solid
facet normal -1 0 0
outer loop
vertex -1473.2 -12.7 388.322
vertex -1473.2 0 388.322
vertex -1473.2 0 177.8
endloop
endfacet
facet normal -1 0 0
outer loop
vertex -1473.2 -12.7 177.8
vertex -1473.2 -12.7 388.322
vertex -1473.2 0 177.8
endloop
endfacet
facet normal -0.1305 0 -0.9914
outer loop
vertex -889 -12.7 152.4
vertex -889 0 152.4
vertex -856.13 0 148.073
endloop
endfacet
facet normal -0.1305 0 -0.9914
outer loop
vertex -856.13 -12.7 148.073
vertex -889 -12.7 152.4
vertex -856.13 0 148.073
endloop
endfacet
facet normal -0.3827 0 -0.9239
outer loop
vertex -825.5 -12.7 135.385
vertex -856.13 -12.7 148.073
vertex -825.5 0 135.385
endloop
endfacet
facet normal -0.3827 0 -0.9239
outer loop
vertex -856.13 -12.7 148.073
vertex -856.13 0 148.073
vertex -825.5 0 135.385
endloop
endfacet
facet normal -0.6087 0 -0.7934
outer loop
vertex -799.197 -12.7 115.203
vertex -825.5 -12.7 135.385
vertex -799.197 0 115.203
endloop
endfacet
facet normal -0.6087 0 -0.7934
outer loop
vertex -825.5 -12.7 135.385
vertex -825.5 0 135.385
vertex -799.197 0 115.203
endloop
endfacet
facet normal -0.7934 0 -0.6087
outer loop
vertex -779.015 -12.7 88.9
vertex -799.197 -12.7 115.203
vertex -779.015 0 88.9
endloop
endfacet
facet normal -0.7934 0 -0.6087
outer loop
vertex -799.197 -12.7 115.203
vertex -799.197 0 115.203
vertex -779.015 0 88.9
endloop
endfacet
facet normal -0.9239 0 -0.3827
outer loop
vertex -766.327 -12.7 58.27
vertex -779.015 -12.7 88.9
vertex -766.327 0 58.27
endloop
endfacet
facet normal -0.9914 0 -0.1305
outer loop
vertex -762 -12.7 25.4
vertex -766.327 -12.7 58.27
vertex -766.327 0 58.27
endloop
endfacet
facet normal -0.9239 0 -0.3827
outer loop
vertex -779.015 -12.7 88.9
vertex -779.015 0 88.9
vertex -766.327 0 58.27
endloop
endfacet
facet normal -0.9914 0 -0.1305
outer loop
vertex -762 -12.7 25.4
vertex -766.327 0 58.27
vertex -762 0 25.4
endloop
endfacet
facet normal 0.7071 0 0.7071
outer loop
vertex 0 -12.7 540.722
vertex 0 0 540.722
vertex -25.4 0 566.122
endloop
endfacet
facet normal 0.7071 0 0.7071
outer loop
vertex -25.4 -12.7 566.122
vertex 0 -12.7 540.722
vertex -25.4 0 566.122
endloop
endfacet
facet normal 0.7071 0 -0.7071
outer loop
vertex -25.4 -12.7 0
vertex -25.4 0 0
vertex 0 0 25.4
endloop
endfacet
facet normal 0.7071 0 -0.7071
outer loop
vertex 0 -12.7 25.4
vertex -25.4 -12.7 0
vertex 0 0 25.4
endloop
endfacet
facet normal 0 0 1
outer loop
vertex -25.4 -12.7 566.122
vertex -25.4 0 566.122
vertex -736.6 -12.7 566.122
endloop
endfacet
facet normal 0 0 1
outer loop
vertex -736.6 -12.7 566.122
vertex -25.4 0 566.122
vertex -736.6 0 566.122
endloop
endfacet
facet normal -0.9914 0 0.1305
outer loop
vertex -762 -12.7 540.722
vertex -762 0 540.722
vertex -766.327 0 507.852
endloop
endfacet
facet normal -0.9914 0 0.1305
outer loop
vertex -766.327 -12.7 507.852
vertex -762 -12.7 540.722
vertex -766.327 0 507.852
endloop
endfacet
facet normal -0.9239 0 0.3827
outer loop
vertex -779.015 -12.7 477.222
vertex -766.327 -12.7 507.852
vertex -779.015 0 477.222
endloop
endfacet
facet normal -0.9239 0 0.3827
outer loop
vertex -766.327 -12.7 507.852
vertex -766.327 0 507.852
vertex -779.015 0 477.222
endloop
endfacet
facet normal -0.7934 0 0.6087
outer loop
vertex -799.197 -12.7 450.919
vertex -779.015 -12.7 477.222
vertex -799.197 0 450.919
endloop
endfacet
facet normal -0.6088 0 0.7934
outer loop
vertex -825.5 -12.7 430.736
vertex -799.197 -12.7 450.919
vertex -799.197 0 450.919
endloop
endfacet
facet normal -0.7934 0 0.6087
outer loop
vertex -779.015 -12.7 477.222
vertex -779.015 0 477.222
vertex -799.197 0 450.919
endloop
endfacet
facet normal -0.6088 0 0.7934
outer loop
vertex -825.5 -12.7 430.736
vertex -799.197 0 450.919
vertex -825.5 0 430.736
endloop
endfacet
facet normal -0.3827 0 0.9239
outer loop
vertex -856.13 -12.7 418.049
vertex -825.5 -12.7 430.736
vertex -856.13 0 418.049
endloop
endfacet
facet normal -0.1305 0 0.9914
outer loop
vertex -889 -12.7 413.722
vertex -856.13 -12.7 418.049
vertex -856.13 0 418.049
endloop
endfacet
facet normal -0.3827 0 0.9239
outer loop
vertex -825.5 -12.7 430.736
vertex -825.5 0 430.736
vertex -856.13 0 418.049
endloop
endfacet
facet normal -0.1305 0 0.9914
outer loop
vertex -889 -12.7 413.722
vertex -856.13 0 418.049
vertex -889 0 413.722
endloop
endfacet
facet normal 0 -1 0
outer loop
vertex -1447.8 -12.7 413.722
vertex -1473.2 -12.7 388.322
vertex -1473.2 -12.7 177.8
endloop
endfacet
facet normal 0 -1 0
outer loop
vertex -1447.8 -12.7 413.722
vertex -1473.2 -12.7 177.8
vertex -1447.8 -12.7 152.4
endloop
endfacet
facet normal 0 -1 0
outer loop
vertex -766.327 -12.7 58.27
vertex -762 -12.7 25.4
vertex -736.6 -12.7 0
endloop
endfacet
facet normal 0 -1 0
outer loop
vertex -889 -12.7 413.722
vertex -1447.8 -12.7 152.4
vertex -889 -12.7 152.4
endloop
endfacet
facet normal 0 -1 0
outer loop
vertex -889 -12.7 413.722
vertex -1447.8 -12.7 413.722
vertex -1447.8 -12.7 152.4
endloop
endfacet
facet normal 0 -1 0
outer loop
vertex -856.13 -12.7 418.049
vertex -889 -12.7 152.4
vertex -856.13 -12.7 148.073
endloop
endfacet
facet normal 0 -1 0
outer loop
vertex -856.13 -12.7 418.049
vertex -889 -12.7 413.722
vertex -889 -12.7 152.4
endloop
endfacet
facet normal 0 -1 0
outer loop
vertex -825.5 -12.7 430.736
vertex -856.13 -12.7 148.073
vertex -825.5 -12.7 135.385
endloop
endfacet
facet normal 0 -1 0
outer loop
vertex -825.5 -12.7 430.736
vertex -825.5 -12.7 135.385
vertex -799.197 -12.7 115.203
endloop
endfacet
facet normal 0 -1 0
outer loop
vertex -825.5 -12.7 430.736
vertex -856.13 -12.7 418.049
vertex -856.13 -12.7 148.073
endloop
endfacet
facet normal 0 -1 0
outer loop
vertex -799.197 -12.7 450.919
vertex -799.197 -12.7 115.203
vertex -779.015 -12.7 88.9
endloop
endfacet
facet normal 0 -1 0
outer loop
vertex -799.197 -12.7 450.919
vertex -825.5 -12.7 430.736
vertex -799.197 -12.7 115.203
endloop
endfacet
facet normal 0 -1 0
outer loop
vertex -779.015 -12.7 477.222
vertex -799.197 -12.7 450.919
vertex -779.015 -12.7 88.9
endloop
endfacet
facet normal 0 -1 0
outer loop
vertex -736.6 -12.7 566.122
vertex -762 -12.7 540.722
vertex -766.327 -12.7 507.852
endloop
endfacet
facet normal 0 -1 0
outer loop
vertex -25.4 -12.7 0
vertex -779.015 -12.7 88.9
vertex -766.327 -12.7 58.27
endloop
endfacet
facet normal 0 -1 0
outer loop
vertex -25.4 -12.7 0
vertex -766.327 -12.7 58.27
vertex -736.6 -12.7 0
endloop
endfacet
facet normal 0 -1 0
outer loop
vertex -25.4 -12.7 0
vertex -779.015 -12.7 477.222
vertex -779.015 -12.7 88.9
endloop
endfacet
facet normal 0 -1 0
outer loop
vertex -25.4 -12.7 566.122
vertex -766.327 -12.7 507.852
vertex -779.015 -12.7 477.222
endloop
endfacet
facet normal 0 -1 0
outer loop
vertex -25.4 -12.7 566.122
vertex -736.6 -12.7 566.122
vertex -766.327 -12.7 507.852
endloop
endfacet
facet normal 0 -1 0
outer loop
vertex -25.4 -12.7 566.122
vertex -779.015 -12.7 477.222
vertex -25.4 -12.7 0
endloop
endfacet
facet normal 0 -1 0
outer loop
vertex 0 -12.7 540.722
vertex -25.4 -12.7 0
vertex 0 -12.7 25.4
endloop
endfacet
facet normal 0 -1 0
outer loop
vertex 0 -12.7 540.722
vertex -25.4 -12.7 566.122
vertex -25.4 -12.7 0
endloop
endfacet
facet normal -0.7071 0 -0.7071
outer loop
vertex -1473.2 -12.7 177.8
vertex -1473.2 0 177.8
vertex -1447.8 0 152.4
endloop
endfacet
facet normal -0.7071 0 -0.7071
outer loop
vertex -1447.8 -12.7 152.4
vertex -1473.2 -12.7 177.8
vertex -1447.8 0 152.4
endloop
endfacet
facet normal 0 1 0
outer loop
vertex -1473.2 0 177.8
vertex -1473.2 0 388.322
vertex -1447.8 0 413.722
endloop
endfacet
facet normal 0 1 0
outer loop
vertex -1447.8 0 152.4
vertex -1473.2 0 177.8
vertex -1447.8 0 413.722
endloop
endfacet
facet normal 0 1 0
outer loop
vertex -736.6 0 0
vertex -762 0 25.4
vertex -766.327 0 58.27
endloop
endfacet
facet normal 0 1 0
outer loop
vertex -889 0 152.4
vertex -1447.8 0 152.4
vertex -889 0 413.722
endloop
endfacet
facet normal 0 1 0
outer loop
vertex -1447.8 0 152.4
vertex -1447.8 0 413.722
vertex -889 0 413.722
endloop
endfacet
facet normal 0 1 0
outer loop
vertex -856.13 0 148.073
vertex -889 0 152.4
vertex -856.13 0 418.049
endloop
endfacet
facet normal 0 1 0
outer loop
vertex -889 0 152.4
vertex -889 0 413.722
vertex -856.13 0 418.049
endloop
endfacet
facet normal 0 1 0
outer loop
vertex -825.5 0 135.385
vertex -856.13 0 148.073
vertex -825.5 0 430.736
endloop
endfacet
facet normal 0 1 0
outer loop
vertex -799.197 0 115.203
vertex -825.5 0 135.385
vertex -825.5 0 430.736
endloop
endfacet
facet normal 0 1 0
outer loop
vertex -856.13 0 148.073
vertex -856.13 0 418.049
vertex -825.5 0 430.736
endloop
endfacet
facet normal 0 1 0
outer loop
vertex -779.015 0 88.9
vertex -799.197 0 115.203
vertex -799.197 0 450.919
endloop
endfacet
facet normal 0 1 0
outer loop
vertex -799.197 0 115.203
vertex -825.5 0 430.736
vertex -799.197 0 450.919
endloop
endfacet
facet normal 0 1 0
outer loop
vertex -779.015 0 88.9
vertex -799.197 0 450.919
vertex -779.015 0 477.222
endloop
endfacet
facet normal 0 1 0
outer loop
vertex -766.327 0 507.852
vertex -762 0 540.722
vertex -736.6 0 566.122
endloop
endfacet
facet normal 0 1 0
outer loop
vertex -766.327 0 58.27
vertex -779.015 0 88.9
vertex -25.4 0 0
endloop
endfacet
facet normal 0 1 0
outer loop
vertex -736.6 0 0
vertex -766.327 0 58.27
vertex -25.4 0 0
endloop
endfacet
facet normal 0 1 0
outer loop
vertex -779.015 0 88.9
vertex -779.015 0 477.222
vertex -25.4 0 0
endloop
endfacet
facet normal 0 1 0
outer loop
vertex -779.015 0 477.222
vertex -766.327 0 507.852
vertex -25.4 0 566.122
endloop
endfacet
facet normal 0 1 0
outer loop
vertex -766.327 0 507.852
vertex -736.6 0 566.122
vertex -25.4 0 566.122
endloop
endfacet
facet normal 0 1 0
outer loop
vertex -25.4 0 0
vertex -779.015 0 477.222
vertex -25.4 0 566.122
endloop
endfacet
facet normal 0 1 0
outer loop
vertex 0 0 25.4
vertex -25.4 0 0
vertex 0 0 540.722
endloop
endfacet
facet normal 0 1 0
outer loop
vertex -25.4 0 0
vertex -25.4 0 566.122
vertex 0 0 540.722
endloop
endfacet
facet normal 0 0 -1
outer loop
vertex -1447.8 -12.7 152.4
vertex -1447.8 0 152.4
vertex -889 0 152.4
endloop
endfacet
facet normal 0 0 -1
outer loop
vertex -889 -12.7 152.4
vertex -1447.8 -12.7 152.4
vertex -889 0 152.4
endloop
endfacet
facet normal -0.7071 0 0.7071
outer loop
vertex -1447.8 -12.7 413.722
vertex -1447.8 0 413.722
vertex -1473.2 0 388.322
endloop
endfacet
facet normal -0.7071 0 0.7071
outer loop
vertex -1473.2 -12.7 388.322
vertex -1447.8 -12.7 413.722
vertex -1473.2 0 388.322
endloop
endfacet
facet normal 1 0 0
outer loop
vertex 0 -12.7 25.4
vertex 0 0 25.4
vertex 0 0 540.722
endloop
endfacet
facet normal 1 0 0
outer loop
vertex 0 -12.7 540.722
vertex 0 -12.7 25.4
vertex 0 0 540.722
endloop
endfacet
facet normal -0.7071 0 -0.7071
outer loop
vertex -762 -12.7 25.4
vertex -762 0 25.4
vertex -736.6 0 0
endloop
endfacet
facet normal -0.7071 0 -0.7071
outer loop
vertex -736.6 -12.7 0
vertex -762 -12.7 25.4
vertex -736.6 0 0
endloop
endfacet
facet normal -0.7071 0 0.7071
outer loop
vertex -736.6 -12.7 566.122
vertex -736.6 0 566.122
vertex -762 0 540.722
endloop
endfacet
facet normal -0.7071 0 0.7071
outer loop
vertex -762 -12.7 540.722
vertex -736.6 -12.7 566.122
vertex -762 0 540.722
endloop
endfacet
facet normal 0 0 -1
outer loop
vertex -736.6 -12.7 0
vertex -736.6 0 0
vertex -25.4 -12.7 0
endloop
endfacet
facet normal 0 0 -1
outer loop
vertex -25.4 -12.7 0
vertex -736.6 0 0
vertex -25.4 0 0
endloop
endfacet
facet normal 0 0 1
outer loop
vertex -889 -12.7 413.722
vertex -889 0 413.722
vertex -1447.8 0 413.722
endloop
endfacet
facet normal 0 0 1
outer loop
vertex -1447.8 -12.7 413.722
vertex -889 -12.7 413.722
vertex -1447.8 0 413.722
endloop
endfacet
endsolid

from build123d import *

# Parameters (mm, degrees)
F1_DEPTH = 12.7


with BuildPart() as f1:
    # F0 (on Front) → F1 (new body)
    with BuildSketch(Plane.XZ):
        with BuildLine():
            Line((-25.4, 0), (0, 25.4))
            Line((0, 25.4), (0, 540.721549))
            Line((0, 540.721549), (-25.4, 566.121549))
            Line((-25.4, 566.121549), (-736.6, 566.121549))
            Line((-736.6, 566.121549), (-762, 540.721549))
            ThreePointArc((-762, 540.721549), (-799.197439, 450.918987), (-889, 413.721549))
            Line((-889, 413.721549), (-1447.8, 413.721549))
            Line((-1447.8, 413.721549), (-1473.2, 388.321549))
            Line((-1473.2, 388.321549), (-1473.2, 177.8))
            Line((-1473.2, 177.8), (-1447.8, 152.4))
            Line((-1447.8, 152.4), (-889, 152.4))
            ThreePointArc((-889, 152.4), (-799.197439, 115.202561), (-762, 25.4))
            Line((-762, 25.4), (-736.6, 0))
            Line((-736.6, 0), (-25.4, 0))
        make_face()
    extrude(amount=F1_DEPTH)


solid = f1.part
